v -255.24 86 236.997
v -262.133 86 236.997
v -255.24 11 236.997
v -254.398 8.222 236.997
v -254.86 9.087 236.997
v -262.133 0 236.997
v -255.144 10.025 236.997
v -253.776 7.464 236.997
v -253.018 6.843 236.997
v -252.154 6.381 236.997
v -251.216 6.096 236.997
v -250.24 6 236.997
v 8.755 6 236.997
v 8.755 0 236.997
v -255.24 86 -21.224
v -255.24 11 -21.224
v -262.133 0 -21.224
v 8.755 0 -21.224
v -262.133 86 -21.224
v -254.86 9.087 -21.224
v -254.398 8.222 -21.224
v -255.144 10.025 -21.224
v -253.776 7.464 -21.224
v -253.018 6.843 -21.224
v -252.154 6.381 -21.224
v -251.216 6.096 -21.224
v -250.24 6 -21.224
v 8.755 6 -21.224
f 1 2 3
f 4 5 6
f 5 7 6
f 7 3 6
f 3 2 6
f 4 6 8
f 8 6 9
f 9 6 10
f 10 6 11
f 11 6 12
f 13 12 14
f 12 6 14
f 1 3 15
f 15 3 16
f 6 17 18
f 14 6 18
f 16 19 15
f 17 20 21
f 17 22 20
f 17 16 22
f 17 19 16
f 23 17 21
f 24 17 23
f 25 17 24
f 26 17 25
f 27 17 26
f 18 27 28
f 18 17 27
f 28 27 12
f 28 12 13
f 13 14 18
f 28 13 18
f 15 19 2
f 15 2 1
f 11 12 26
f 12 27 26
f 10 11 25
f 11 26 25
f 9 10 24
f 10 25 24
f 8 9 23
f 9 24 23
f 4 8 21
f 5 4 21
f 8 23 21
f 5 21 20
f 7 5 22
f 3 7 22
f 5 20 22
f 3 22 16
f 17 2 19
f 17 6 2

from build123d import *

# Parameters (mm, degrees)
SKETCH1_W           = 270.887813212
SKETCH1_H           = 258.221174697
BASE_DEPTH          = 6
SKETCH2_W           = 6.892214754
SKETCH2_H           = 258.221174697
BOSS_EXTRUDE2_DEPTH = 80
FILLET1_R           = 5


with BuildPart() as part:
    # Sketch1 → Base (new body)
    with BuildSketch(Plane(origin=(0, 0, 0), x_dir=(1, 0, 0), z_dir=(0, 1, 0))):
        with Locations((-126.688596317, -107.886320424)):
            Rectangle(SKETCH1_W, SKETCH1_H)
    extrude(amount=BASE_DEPTH)

    # Sketch2 → Boss-Extrude2 (add)
    with BuildSketch(Plane(origin=(0, 6, 0), x_dir=(1, 0, 0), z_dir=(0, 1, 0))):
        with Locations((-258.686395546, -107.886320424)):
            Rectangle(SKETCH2_W, SKETCH2_H)
    extrude(amount=BOSS_EXTRUDE2_DEPTH)

    # Fillet1
    fillet1_edges = [part.edges().sort_by_distance(p)[0] for p in [
        (-255.240288169, 6, 107.886320423),
    ]]
    fillet(fillet1_edges, radius=FILLET1_R)


solid = part.part
